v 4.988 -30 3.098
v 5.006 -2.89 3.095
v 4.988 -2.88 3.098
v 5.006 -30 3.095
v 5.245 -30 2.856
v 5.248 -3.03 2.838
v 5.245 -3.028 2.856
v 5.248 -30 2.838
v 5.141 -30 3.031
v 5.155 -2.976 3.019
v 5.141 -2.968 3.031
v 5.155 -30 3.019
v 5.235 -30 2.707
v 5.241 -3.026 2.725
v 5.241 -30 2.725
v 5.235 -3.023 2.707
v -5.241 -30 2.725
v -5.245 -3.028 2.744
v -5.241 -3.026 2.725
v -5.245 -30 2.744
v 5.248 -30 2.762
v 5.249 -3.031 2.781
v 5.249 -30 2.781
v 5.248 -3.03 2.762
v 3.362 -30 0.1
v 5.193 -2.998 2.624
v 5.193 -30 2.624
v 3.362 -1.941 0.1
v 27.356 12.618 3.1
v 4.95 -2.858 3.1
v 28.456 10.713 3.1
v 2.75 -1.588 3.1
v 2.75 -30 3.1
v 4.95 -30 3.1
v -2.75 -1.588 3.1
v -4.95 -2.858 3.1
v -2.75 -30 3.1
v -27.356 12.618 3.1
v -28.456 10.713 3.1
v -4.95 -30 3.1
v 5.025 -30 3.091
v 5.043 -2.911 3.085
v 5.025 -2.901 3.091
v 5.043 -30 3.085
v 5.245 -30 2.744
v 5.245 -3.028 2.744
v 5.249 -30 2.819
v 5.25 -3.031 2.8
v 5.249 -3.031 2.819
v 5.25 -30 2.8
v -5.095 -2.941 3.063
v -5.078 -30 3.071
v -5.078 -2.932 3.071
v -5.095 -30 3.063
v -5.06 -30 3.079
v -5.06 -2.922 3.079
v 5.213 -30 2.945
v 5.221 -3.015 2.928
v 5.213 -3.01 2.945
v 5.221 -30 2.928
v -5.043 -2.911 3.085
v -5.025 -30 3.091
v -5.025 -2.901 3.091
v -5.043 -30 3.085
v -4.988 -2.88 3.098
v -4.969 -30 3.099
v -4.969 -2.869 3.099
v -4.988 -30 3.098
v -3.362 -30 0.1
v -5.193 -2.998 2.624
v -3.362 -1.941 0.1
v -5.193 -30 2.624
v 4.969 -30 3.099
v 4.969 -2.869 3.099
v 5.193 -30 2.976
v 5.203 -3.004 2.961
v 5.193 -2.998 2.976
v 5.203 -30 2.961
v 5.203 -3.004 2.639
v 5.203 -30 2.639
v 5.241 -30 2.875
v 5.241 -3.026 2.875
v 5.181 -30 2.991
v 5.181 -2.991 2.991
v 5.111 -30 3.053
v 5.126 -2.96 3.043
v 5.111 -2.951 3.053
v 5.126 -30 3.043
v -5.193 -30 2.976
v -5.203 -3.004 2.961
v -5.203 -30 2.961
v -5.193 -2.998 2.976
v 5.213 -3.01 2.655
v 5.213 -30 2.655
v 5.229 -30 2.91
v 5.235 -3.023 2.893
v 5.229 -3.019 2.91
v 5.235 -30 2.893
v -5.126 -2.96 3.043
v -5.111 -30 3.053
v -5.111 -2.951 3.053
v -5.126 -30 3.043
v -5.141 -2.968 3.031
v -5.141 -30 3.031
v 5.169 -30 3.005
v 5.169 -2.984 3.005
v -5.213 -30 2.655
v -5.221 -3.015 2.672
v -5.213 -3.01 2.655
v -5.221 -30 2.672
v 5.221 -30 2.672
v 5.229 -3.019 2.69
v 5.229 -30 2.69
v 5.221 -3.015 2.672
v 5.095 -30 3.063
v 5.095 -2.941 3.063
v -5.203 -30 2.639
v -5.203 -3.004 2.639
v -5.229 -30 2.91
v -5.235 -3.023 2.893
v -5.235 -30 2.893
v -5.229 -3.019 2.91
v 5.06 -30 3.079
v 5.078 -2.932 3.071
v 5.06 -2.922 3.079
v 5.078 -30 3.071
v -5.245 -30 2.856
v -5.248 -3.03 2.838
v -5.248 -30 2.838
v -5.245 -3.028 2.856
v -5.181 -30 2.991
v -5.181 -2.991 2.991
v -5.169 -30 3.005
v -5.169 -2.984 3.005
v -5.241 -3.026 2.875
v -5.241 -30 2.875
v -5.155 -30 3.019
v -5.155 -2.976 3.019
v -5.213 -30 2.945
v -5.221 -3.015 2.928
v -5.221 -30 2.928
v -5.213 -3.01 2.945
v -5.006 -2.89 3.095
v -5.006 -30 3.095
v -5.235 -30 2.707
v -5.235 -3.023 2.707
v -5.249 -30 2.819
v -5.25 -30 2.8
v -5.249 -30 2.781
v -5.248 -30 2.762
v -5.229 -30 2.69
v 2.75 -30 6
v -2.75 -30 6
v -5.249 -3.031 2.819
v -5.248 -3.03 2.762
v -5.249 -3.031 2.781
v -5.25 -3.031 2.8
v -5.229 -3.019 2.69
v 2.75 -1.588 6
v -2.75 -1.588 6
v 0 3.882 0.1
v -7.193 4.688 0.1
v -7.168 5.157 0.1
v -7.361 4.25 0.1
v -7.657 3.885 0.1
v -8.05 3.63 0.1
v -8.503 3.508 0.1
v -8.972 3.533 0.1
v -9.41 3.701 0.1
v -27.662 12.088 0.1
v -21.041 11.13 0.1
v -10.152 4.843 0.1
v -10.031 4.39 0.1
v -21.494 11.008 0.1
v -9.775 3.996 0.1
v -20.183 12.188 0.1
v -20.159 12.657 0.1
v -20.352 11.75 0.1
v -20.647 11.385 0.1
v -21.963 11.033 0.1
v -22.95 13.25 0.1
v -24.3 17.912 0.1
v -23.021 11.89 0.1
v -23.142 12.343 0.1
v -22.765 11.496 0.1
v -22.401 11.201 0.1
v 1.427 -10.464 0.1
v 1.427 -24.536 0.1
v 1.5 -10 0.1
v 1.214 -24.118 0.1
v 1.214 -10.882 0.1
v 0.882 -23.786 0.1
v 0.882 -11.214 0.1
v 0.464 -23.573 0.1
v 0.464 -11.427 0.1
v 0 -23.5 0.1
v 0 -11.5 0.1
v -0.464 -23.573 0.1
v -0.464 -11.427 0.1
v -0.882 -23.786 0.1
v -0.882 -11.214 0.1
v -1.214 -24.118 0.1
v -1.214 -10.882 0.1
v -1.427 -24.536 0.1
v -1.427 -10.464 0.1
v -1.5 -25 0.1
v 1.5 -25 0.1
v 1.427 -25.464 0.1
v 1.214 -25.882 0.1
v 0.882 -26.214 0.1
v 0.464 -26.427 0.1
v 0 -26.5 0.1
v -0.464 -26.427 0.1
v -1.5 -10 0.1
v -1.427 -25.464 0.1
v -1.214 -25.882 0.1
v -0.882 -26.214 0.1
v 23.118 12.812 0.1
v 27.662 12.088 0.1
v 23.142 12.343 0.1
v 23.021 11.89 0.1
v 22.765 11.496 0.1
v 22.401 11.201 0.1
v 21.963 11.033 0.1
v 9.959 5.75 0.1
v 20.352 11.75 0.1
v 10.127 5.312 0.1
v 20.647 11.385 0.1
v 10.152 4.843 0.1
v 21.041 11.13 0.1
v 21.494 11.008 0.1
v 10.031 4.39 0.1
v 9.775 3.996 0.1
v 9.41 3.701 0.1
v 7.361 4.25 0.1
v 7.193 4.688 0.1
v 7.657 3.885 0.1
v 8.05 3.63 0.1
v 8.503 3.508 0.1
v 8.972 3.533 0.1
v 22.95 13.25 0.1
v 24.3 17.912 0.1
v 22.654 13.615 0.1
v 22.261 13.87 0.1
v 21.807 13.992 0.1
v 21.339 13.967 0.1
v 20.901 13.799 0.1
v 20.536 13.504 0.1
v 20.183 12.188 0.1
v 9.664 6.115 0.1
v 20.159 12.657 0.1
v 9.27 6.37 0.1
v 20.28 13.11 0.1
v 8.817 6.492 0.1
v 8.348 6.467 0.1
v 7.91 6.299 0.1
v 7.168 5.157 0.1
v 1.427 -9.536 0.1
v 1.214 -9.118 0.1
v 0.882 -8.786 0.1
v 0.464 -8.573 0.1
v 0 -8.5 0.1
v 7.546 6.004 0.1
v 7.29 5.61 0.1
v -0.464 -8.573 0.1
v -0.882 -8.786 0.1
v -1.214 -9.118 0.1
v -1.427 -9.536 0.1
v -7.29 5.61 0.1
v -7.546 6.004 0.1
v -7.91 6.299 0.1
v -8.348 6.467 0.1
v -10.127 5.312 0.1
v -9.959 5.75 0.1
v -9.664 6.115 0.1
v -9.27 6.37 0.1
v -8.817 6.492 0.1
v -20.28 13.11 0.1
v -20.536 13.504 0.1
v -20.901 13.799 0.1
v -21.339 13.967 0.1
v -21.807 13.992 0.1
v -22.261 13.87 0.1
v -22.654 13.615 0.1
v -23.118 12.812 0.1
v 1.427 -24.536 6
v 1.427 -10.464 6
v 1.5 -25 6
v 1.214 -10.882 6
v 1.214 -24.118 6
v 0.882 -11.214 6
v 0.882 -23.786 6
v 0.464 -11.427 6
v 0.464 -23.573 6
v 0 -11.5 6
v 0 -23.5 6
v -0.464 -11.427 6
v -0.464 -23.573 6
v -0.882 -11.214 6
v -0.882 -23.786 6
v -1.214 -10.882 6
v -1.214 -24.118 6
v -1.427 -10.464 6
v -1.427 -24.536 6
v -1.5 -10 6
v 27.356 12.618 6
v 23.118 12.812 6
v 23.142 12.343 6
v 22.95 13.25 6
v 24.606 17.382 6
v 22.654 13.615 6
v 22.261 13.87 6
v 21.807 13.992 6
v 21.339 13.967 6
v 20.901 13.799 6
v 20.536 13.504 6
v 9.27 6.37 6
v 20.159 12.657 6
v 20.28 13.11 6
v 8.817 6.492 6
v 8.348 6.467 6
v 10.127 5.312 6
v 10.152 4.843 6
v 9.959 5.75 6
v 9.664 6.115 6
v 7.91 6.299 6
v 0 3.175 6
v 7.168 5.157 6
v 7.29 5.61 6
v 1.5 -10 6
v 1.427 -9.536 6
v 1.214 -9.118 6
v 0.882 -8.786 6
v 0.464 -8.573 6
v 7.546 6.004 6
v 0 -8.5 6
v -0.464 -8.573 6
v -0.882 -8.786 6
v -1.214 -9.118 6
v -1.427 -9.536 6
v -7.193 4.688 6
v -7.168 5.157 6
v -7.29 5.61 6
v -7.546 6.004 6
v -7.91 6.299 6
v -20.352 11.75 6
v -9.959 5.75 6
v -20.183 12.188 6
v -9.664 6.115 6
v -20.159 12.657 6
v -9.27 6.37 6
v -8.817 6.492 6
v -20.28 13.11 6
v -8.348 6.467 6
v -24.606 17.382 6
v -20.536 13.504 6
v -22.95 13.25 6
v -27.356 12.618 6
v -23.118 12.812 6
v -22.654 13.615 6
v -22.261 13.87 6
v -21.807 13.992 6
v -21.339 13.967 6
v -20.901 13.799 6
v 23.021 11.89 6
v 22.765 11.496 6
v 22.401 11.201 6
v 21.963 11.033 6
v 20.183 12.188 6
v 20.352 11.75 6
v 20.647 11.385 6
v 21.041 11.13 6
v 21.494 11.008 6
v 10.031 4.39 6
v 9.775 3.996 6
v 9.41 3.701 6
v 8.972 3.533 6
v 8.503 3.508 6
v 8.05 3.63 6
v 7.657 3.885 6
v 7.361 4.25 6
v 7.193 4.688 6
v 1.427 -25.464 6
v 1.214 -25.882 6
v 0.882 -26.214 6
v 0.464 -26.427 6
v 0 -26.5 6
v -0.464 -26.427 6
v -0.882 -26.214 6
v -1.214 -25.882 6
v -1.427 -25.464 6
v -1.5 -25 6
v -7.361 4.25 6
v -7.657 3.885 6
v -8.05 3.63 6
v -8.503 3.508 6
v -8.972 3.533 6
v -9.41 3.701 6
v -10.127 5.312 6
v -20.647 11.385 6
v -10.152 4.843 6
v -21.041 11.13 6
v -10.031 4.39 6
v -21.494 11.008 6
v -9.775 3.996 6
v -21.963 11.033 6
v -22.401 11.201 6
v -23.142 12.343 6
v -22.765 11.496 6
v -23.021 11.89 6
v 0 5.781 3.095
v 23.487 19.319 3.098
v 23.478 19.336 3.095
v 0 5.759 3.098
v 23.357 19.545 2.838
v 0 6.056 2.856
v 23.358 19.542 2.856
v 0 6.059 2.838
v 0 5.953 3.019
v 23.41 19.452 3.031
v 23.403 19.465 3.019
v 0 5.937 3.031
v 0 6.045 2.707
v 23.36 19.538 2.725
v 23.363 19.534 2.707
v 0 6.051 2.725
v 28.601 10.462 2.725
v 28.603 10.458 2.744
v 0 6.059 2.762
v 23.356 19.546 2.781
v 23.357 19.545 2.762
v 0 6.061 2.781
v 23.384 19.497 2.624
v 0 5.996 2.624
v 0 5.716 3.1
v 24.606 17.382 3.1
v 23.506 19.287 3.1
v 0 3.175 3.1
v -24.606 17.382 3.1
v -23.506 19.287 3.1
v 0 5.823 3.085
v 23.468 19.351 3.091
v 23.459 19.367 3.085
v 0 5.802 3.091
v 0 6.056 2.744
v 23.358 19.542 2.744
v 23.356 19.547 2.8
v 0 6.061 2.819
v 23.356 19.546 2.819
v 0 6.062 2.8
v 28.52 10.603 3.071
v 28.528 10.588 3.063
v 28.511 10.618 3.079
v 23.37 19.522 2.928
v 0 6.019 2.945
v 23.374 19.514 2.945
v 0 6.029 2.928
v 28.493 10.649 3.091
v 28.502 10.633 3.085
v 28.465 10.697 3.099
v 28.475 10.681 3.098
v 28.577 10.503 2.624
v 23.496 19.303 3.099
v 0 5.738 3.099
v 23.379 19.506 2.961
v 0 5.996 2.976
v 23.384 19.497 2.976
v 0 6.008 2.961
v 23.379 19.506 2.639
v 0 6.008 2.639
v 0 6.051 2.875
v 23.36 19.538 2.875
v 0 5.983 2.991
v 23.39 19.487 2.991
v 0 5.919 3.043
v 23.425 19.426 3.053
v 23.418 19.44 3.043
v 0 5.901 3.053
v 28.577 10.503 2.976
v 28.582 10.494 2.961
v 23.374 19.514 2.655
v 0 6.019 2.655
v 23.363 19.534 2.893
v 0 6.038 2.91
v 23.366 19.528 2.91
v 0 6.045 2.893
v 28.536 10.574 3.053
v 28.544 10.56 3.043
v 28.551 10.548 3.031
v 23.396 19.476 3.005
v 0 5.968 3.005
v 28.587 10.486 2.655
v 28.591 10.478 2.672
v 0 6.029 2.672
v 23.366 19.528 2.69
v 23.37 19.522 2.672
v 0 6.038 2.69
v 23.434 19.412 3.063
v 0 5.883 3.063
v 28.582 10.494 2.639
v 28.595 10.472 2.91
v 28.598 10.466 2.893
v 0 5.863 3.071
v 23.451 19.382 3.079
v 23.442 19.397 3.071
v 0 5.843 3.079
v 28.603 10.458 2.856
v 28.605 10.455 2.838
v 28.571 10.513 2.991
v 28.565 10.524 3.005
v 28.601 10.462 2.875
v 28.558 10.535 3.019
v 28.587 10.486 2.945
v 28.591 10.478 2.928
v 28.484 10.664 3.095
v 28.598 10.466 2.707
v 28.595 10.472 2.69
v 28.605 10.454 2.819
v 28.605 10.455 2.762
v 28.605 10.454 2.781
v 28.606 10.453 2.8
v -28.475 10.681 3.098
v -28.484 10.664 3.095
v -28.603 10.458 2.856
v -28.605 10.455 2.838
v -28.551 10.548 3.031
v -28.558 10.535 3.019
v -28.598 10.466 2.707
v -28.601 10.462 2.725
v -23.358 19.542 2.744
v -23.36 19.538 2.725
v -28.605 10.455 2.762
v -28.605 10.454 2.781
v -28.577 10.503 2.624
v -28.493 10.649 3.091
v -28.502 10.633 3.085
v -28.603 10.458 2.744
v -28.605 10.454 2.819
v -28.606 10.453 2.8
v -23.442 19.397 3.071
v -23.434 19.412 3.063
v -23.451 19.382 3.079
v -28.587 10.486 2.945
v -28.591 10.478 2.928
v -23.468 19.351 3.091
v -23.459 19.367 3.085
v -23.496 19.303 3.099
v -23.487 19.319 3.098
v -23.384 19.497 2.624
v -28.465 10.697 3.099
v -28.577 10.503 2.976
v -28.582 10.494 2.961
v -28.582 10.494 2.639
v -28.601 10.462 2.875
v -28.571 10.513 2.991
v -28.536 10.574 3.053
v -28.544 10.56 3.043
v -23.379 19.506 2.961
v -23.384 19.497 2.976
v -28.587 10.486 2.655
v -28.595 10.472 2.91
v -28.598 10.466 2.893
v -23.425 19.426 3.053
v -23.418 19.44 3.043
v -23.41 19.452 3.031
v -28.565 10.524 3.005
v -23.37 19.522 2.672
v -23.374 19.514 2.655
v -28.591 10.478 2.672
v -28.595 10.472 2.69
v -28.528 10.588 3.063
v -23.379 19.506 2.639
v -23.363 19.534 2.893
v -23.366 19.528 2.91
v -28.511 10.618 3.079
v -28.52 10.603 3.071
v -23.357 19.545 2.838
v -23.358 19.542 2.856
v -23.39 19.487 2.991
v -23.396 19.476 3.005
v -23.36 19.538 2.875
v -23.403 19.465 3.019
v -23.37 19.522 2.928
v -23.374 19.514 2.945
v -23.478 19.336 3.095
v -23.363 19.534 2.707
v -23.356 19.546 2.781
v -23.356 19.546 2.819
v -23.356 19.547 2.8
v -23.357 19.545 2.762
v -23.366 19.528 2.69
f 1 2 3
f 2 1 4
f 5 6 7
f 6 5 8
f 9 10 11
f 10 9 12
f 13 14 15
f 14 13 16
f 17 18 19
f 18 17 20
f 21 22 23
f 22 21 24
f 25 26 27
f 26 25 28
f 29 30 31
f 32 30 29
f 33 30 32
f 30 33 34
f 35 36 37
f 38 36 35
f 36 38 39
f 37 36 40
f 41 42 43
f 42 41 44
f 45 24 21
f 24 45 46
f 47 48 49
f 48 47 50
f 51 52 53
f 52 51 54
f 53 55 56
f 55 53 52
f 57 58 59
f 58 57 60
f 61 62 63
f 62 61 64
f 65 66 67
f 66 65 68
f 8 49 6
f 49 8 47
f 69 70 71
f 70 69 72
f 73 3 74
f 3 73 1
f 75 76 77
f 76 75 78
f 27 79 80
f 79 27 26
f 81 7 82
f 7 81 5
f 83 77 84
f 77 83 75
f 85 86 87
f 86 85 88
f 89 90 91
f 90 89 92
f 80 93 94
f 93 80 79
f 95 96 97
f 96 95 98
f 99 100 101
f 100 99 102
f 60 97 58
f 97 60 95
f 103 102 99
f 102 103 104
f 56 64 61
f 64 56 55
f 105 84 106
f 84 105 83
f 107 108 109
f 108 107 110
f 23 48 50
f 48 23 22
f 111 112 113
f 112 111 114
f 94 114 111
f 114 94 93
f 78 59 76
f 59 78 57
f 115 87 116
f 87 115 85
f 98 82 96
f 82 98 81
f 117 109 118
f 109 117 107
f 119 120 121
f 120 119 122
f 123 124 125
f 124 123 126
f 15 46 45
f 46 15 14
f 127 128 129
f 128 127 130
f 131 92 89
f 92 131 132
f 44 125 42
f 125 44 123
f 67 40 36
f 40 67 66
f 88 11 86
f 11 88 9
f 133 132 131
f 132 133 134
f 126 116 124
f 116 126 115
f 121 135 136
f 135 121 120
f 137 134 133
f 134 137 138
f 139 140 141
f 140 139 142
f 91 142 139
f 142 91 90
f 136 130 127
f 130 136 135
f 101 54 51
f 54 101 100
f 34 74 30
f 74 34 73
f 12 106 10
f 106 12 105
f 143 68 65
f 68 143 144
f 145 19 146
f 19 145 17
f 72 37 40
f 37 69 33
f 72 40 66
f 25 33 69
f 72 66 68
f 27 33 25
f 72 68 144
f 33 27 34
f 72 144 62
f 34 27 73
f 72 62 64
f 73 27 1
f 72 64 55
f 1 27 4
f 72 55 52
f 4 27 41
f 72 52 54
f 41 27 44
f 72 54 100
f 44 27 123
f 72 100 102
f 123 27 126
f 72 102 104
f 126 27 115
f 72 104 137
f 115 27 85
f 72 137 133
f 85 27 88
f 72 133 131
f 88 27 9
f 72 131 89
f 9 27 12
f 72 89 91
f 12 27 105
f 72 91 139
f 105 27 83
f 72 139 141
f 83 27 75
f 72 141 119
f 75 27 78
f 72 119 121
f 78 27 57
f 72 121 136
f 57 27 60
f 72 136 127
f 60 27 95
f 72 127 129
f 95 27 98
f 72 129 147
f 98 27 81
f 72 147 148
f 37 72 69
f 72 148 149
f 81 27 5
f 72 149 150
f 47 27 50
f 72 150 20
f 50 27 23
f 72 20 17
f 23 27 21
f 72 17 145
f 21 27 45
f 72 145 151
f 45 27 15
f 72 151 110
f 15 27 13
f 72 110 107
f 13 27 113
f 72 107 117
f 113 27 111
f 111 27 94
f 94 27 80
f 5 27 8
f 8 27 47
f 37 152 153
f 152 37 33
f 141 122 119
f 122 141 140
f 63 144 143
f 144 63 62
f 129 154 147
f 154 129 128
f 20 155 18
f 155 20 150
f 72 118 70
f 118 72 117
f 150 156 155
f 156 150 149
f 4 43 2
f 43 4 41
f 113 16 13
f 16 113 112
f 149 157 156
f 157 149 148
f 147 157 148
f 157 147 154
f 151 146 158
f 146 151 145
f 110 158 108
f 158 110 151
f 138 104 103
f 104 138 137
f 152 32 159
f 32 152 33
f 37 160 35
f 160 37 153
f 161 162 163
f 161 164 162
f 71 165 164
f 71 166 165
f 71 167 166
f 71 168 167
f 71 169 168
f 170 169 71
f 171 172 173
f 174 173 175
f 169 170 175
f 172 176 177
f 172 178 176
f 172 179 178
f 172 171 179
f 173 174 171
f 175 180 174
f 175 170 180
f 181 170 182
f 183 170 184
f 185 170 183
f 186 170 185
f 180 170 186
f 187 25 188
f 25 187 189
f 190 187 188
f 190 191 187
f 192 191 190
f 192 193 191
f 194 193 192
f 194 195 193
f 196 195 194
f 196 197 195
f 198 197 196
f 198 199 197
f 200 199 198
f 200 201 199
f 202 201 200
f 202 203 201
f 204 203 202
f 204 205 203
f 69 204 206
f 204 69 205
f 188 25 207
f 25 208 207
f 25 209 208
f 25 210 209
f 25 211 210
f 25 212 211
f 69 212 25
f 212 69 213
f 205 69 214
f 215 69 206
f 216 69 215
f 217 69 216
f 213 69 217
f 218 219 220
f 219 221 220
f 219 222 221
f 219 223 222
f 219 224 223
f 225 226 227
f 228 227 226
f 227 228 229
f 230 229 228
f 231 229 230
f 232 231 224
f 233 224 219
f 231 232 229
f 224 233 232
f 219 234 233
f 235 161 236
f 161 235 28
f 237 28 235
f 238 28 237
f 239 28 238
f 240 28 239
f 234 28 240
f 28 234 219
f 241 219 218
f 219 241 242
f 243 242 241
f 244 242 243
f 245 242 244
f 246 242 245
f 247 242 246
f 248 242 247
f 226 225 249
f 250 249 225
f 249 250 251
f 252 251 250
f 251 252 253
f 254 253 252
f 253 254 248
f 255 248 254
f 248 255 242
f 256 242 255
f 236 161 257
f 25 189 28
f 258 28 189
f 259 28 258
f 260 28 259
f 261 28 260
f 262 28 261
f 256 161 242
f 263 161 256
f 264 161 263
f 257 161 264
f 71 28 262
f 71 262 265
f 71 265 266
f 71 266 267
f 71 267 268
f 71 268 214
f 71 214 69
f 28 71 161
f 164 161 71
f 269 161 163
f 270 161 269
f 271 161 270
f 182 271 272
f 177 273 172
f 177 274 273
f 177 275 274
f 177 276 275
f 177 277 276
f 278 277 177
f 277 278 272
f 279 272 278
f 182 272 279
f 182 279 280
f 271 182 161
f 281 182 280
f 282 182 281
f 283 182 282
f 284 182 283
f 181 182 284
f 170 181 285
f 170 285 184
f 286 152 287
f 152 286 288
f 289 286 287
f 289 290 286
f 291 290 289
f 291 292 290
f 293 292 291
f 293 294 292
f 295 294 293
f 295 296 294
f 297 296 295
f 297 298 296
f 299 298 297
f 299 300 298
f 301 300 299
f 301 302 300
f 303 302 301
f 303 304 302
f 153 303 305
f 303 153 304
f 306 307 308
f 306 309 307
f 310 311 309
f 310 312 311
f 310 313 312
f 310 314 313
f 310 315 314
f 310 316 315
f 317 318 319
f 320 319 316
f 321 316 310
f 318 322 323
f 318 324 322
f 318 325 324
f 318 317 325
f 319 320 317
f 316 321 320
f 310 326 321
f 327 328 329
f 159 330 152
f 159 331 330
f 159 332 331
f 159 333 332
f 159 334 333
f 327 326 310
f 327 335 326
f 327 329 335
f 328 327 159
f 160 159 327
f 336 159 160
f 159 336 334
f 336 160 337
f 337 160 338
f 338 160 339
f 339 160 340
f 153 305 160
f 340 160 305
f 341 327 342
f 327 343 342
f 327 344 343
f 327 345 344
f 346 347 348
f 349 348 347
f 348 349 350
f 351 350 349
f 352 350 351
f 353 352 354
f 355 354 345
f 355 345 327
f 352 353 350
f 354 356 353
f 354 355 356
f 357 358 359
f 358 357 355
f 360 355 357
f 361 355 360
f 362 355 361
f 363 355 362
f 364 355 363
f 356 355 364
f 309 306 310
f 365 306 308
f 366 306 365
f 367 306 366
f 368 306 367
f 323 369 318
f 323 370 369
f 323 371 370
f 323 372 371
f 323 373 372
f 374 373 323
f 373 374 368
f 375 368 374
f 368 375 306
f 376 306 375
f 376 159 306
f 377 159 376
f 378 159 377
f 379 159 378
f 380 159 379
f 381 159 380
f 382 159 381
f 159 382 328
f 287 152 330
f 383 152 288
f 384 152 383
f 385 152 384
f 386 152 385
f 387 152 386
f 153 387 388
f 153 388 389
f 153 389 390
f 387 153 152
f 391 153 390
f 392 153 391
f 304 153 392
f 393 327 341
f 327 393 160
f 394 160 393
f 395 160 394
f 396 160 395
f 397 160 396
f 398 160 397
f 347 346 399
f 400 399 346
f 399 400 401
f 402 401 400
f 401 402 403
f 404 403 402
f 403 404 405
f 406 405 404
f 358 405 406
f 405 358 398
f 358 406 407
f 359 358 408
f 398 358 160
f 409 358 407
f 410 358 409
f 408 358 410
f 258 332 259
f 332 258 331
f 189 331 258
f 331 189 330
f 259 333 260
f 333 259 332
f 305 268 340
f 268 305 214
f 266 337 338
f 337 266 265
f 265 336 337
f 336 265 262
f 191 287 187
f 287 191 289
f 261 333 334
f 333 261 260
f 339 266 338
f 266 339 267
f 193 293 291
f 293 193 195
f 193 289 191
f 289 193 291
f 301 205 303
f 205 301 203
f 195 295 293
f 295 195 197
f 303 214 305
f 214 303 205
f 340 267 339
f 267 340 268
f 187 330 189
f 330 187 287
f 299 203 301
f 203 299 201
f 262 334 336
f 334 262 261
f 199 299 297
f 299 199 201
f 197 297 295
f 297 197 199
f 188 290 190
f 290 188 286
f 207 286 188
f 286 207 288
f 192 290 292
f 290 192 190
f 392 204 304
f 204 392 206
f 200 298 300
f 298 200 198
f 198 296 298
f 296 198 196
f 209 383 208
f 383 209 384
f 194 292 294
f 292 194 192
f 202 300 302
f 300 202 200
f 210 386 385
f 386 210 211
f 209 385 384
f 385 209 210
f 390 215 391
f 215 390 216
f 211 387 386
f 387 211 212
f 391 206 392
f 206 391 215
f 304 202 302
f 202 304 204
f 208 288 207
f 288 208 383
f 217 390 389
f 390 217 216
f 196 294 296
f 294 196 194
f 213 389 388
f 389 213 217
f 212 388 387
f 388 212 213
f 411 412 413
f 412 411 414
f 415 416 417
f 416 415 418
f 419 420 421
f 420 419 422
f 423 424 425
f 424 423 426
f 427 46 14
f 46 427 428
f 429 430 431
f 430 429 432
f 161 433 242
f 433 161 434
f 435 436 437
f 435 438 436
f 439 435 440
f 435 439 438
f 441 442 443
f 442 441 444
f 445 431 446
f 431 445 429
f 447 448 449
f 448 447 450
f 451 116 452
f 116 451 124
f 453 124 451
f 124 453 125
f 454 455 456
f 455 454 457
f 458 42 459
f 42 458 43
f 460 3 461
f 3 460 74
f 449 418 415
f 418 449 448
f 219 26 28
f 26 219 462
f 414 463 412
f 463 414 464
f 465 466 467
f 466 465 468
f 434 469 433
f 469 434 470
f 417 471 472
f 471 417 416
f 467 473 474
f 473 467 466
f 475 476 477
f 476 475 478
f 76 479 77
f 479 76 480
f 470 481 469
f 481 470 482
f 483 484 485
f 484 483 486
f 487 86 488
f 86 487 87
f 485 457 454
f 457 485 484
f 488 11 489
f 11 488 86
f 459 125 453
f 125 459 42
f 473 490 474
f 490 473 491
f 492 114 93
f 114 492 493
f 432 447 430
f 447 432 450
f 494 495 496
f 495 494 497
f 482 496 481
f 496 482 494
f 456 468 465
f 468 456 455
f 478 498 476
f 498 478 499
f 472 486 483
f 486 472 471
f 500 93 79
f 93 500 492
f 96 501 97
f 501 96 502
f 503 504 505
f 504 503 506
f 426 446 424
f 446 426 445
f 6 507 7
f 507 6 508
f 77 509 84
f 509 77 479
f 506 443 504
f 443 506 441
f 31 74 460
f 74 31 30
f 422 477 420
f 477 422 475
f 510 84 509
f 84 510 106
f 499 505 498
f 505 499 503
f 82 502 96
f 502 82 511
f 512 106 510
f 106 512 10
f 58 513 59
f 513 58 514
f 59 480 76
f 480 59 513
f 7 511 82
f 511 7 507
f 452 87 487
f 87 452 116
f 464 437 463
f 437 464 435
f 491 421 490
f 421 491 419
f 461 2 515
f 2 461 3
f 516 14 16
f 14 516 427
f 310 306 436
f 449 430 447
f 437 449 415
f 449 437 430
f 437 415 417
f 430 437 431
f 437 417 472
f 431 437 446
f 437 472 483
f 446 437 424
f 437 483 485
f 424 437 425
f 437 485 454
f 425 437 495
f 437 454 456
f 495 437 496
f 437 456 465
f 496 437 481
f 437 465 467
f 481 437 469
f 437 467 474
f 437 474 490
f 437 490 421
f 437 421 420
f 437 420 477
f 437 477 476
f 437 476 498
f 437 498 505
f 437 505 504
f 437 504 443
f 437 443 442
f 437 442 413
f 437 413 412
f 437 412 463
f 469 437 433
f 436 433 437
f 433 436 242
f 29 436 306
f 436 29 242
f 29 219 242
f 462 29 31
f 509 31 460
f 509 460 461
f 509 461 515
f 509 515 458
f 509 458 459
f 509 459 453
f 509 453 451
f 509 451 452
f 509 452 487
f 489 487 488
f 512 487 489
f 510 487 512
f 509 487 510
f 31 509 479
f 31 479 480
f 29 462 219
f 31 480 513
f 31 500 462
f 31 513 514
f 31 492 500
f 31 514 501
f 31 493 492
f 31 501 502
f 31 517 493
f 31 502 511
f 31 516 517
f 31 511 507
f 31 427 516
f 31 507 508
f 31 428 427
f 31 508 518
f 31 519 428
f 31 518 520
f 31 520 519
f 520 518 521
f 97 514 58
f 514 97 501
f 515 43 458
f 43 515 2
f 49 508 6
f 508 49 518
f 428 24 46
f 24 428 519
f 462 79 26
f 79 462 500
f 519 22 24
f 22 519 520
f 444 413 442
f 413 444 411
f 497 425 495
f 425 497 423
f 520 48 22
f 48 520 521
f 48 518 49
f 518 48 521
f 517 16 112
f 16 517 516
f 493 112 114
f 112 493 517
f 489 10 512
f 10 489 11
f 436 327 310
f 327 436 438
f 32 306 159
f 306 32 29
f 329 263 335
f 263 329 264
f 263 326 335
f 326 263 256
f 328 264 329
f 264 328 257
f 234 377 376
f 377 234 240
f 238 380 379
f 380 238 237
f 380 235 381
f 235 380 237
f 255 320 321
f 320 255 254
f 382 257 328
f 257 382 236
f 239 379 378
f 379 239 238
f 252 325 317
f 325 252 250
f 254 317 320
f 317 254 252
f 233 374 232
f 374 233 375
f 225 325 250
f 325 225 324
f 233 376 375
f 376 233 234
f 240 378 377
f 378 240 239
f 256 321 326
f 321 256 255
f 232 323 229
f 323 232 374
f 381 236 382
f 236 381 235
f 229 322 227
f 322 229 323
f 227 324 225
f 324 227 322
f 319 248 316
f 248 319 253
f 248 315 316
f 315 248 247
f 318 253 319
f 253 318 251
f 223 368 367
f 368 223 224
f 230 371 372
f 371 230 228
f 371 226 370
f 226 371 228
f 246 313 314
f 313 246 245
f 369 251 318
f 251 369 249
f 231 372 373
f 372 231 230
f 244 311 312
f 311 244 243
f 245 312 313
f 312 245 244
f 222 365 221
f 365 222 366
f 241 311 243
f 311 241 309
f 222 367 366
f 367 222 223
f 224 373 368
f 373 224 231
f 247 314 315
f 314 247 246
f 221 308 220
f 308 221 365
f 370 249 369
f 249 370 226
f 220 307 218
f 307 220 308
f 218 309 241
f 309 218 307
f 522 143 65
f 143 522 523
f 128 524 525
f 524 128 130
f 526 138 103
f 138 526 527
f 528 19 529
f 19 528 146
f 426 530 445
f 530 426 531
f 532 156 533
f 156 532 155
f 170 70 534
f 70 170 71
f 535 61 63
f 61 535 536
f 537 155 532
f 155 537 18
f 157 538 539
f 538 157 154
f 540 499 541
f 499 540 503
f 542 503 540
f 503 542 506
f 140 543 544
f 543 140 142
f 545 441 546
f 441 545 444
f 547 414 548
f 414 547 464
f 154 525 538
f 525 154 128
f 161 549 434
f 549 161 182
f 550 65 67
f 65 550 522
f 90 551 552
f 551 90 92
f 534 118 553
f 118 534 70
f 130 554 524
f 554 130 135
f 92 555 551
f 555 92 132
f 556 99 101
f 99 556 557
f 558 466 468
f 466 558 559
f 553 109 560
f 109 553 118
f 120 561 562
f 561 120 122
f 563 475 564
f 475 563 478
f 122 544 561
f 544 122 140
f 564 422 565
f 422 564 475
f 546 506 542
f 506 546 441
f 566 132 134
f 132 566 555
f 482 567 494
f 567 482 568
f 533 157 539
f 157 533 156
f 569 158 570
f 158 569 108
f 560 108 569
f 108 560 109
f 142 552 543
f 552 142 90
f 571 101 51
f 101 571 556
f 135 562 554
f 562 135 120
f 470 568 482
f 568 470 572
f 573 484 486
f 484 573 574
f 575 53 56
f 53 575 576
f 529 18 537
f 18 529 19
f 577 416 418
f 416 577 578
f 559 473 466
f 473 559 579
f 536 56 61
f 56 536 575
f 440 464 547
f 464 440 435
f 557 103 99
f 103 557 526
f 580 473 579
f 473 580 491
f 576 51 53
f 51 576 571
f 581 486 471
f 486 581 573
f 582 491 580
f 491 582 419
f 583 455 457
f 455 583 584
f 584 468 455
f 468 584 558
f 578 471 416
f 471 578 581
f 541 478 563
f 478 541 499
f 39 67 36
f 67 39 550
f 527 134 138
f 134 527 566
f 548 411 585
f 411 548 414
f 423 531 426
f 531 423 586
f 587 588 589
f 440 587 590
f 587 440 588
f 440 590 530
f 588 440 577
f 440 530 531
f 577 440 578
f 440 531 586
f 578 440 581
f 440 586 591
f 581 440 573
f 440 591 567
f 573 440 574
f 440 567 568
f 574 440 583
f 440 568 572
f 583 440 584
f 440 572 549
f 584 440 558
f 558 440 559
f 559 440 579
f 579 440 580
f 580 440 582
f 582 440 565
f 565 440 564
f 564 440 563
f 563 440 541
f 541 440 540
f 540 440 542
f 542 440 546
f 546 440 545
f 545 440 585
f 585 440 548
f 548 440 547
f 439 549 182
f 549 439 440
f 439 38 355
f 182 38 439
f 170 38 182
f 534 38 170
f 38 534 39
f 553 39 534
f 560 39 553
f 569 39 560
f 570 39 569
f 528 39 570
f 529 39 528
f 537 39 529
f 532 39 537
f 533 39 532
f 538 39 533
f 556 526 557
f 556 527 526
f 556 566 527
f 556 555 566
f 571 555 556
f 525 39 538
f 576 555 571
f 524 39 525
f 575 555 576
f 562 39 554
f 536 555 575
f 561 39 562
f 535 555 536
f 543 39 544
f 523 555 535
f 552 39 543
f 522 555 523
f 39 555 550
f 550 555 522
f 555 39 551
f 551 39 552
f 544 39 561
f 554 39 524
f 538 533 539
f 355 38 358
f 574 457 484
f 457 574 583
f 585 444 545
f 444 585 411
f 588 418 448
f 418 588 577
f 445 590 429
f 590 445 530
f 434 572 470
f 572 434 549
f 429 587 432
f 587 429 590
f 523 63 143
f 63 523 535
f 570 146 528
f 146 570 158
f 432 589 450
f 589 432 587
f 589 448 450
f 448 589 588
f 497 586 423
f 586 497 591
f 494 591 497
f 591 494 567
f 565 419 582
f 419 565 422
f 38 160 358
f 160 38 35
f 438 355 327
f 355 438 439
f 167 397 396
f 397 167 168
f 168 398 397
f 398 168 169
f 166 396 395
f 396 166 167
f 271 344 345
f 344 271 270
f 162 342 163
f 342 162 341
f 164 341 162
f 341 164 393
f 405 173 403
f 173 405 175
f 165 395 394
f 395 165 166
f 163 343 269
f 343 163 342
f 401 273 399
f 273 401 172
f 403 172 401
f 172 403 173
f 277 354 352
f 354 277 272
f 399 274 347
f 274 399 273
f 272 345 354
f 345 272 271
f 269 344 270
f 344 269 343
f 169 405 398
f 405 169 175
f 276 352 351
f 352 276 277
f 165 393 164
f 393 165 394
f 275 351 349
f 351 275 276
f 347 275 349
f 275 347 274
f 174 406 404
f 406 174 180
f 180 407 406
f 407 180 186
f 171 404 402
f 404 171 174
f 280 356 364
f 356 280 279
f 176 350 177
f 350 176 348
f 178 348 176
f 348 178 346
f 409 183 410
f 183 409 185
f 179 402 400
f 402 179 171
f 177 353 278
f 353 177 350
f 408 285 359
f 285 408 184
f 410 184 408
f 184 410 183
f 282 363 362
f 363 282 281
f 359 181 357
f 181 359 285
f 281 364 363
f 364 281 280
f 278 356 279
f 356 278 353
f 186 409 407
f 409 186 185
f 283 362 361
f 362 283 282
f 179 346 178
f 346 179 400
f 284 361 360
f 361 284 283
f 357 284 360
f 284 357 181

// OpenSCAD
*!intersection() {
  translate([-160,250]) rotate([90,0]) import("Fully_3D-printable_wind-up_car_gift_card 2/files/old_gift_card_1.stl");
  translate([5.25,34,0]) cylinder(d=17,h=10,$fn=50);
}
base_maxd=25.4*4.6;
base_dists=[60,base_maxd];
*rotate([0,0,0]) rotate_extrude(angle=120) translate([0,12]) square([51,8]);
*chuck();
*jaw(h=14,deep=20,holes=2);
*for(r=[0:120:359]) rotate([0,0,r])
*translate([21,0,14]) 
  rotate([180,90]) rotate([0,0,90]) jaw(deep=20,holes=2);
*base();
jig();

skip_jaw=1;
include <QRClamp.scad>;

module jig() {
  for(r=[0:120:359]) rotate([0,0,r]) {
    difference() {
      intersection() {
        rotate([90,0]) translate([0,5.7,10]) groove_clamp(40,extrusion_size/2 - extrusion_groove_lip/2);
        translate([-10,-40]) cube([20,40,6]);
      }
      for(y=[-10,-25]) translate([0,y,-.01]) cylinder(d=3,h=10,$fn=20);
    }
  }
}
module base() {
  difference() {
    union() {
      cylinder(d=inches(1.125),h=20,$fn=50);
      linear_extrude(4,convexity=4) {
        difference() {
          union() {
            for(d=base_dists)
              difference() {
                circle(d=d,$fn=100);
                circle(d=d-10,$fn=100);
              }
            for(r=[0:120:359]) rotate([0,0,r]) translate([0,-2.5]) square([base_maxd/2,5]);
              
            for(d=base_dists,r=[0:120:359]) rotate([0,0,r]) translate([d/2-2.5,0]) circle(d=12,$fn=40);
          }
          for(d=base_dists,r=[0:120:359]) rotate([0,0,r]) translate([d/2-2.5,0]) circle(d=5,$fn=30);
        }
      }
    }
    translate([0,0,2])
      cylinder(d=inches(1/2),h=20,$fn=50);
    rotate([0,0,60]) translate([0,0,14]) for(r=[0:120:359]) rotate([0,0,r]) rotate([0,90]) {
      cylinder(d=3,h=20,$fn=20);
      translate([-13.5,-3.5,8]) cube([17,7,3]);
    }
  }
}
module chuck() {
  difference() {
    union() {
      cylinder(d=100,h=20,$fn=100);
    }
    for(off=[5:2.5:50]) rotate_extrude($fn=100) {
      w=off%10==0?1:.2;
      translate([off-w/2,19.6]) square([w,1.01]);
    }
    for(r=[0:120:359]) rotate([0,0,r]) {
      translate([0,0,14]) rotate([0,90]) rotate([0,0,90]) linear_extrude(50.01) {
        keyhole_profile();
  //      translate([0,-4]) square([4,8]);
        
      }
    }
    translate([0,0,-.01]) {
      cylinder(d=inches(1/2)+.2,h=5,$fn=40);
      translate([0,0,4.99])
        cylinder(d1=inches(1/2)+.2,d2=inches(1/2)-2,h=2,$fn=40);
    }
    *translate([0,0,10]) cylinder(d=inches(3/4)/cos(30),h=10.02,$fn=6);
  }
}
module jaw(h=10,deep=16,holes=2)
{
  difference() {
    union() {
      translate([0,5.7,10]) groove_clamp(20,extrusion_size/2 - extrusion_groove_lip/2);
      linear_extrude(deep,convexity=3) {
        translate([-1.8,5.6]) square([3.6,4]);
        translate([-5,6.2]) square([10,h]);
        *offset(-.2) keyhole_profile();
      }
    }
    mirrorx() translate([1,0,deep]) rotate([0,30]) cube(h+8);
    if(holes>0)
    for(z=[(deep-6)/holes/2:(deep)/holes:deep])
    translate([0,0,z]) rotate([-90,0])
      cylinder(d=3,h=7+h,$fn=20);
    
  }
}
module keyhole_profile()
{
  polygon([[-4,0],[-4,2],[-2,4],[-2,6.01],[2,6.01],[2,4],[4,2],[4,0]]);
}
module bolt(bd=8,hd=14.6,h=30)
{
  cylinder(d=hd,h=hd/3,$fn=6);
  translate([0,0,hd/3-.01])
    cylinder(d=bd,h=h,$fn=40);
}
module mirrorx(off=0)
{
  translate([off/2,0]) for(m=[0,1]) mirror([m,0]) translate([off/-2,0]) children();
}
module mirrory(off=0)
{
  translate([0,off/2,0]) for(m=[0,1]) mirror([0,m,0]) translate([0,off/-2,0]) children();
}
module mirrorz(off=0)
{
  translate([0,0,off/2]) for(m=[0,1]) mirror([0,0,m]) translate([0,0,off/-2]) children();
}
function inches(in) = 25.4*in;
